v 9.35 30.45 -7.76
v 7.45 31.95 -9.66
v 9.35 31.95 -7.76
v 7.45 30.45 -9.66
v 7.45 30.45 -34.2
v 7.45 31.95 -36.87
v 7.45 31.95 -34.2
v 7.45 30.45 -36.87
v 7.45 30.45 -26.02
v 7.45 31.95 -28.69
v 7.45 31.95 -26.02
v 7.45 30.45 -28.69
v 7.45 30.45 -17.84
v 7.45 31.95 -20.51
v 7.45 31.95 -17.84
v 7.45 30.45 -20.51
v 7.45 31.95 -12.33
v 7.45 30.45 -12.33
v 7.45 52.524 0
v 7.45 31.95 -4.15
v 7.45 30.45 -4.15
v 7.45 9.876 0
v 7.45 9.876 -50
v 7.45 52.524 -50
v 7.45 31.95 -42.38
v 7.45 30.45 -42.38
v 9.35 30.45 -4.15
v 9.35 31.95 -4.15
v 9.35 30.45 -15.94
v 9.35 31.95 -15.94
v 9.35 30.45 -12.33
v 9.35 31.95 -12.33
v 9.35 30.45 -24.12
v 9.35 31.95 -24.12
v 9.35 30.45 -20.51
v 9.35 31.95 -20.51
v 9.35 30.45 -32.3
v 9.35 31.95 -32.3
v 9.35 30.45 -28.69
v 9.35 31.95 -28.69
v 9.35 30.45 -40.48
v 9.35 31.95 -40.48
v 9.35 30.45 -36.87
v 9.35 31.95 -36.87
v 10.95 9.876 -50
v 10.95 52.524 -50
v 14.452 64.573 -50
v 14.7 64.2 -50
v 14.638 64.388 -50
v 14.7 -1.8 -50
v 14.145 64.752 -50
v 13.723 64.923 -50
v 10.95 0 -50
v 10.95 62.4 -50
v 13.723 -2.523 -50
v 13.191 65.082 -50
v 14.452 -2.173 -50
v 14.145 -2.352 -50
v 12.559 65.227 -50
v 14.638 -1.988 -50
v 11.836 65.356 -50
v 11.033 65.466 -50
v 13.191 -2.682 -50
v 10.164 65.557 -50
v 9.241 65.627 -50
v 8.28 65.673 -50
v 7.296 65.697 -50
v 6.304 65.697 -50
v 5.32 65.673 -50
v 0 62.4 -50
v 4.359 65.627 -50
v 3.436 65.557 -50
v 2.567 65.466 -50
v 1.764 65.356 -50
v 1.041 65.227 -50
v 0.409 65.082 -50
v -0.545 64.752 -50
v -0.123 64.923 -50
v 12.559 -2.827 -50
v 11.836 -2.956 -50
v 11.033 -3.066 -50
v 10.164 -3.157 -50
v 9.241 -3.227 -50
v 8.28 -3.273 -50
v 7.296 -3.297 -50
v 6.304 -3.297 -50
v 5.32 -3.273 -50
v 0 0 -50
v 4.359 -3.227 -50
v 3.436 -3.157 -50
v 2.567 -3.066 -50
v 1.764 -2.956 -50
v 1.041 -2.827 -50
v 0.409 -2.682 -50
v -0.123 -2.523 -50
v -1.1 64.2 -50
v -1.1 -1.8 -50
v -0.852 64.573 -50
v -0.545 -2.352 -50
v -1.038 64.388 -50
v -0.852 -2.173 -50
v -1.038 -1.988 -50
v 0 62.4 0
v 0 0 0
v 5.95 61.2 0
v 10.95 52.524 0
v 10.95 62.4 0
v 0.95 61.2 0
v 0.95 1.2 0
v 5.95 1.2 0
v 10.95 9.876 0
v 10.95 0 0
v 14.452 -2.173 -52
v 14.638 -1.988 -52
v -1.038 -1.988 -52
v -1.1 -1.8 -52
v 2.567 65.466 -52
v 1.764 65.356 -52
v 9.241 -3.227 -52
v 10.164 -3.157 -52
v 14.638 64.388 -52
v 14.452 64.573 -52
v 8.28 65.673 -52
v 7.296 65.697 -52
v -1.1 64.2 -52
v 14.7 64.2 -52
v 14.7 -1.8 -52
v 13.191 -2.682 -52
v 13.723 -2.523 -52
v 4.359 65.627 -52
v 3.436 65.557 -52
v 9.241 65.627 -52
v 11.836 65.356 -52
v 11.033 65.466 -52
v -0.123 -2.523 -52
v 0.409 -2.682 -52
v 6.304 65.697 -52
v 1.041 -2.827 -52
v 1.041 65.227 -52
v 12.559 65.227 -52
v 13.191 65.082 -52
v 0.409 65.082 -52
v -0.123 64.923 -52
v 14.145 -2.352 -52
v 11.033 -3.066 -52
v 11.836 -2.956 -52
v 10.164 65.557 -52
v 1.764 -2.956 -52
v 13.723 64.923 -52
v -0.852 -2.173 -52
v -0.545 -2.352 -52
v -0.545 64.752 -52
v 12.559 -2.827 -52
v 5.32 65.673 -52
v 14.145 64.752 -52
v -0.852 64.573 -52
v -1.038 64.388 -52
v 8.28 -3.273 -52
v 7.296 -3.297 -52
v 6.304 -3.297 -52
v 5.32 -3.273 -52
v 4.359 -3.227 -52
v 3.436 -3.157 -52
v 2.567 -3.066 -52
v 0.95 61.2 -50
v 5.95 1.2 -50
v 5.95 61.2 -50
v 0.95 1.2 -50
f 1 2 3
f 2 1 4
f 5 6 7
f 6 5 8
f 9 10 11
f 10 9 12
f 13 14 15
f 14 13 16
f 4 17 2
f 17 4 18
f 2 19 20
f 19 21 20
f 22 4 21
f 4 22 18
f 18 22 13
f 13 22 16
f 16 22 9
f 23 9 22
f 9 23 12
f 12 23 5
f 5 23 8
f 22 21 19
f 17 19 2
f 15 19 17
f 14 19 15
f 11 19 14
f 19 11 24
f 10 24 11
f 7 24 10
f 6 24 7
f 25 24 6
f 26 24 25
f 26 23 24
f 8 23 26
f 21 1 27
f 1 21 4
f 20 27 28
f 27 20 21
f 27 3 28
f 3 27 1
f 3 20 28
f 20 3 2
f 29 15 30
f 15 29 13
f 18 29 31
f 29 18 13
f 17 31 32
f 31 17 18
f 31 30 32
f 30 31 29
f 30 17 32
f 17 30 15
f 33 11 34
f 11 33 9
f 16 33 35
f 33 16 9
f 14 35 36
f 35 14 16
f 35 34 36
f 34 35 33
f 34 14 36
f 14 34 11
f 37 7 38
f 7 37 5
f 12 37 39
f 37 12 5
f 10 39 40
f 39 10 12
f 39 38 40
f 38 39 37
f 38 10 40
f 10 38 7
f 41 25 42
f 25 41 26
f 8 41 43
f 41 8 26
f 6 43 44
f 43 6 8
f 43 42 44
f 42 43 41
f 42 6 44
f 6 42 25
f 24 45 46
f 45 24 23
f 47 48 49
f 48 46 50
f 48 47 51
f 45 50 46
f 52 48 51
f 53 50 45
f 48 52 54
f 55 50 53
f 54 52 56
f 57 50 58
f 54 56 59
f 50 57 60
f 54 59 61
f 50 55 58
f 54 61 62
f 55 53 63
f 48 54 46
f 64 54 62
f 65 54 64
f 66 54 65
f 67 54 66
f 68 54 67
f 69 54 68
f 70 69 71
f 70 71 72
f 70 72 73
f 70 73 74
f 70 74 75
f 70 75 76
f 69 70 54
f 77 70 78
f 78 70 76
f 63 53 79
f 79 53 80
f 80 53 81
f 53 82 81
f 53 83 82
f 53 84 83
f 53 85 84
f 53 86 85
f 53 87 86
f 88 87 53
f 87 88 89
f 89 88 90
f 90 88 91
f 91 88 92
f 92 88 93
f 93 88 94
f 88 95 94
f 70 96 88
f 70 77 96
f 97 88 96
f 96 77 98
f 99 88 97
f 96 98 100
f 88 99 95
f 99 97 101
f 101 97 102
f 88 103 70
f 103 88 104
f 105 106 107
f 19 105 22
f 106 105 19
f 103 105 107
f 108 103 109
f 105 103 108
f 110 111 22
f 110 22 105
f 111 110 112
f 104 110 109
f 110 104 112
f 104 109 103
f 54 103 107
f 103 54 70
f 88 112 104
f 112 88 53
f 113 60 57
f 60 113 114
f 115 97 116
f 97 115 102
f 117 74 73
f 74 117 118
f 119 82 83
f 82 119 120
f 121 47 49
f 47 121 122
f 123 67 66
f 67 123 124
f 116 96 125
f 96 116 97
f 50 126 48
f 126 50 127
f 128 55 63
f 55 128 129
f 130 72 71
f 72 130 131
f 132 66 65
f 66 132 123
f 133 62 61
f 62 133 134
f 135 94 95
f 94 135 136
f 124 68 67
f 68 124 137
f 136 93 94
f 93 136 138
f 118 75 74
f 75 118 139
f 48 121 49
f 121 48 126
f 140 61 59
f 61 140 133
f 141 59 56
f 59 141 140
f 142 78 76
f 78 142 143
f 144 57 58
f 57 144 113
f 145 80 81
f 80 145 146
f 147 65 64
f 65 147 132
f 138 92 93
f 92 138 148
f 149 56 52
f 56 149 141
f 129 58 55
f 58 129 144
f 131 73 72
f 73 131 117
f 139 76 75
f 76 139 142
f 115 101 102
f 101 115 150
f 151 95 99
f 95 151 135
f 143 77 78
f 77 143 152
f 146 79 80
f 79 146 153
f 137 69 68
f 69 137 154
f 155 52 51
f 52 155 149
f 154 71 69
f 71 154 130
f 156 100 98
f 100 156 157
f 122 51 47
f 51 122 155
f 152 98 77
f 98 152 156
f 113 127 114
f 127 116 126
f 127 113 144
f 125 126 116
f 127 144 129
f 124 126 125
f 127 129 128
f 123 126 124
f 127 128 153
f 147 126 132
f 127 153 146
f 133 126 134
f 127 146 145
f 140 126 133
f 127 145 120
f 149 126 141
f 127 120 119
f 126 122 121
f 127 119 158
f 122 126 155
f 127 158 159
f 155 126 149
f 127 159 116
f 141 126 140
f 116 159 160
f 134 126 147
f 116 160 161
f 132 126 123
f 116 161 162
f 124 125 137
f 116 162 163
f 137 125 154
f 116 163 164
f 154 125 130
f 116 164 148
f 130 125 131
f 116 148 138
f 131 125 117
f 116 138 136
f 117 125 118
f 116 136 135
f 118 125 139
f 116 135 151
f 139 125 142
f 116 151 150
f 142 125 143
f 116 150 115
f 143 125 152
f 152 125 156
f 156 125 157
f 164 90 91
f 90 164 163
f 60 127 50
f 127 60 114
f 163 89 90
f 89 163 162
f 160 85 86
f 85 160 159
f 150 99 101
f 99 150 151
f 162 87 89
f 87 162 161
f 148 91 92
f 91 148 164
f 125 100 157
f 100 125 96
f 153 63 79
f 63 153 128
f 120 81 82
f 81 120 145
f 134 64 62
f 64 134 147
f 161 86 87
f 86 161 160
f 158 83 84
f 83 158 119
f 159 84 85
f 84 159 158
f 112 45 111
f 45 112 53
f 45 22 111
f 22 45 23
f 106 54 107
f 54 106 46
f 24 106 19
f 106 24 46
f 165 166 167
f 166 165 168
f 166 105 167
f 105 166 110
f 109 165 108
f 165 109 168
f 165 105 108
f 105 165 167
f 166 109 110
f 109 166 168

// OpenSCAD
/* [Which Part] */

// Part to render
part = "InnerBoxPrint"; // [ InnerBoxPrint, OuterBoxPrint1, OuterBoxPrint2, SliderPrint, InnerBox, OuterBox, Slider ]

// Used for Slider part only.  Which slider number this is, 0-indexed.
slider_num = 0;

// Used for Slider part only.  Which position number this slider is coded for, 0-indexed.
position_num = 0;


/* [Main] */

// The string of position labels to use for the primary scale.
primary_scale = "0123456789";

// The string of position labels to use for the secondary scale, or undef if only one scale.
secondary_scale = undef;

// Which scale (0 for primary, 1 for secondary) to use for each slider.  This also defines the number of sliders.
slider_scales = [ 0, 0, 0, 0, 0 ];

// Inner dimensions of box cavity: width, depth, height; when drawer is facing to the right
inner_size = [ 50, 60, 5 ];


/* [Misc] */

// Depth of the detent hole
detent_height = 0.7;

// Maximum length of the detent lever arm (from the slider connector piece to the detent peg).  A smaller length may be chosen if possible to fit in two detent pegs.
detent_lever_arm_length_max = 20.0;

// Minimum length of the detent lever arm.
detent_lever_arm_length_min = 10.0;

// Defines the width of the margins on the +x and -x side of the box top, as a fraction of the box width
outer_box_top_margin_frac = 0.1;

// The width of the separating walls between sliders, as a fraction of the total width of the slider space
slider_separator_width_frac = 0.03;

// Minimum absolute width of separating walls between sliders.  If the calculated width is below the minimum, separating walls will be removed entirely.
min_between_slider_wall_width = 2;

// The length of the connecting piece of the slider, as a fraction of the outer box depth.  Larger values are stronger but reduce travel length and compress symbols.  The multiplier is arbitrarily chosen.  This is the main parameter to tweak for altering travel distance vs slider stabilization in this dimension.
slider_connector_length_frac = 0.083;

// The width of the connecting piece of the slider, as a fraction of the space between the centers of 2 adjacent sliders.  This also determines slot width.
slider_connector_width_frac = 0.2;

// Amount the handle on the slider protrudes
slider_handle_height = 1.5;

// The depth (along the length of the slider) of space that the handle takes up, as a fraction of the length of the slider's top wing
slider_handle_depth_frac = 0.125;

// Minimum opening span of the slider gates.  This ensures proper printing and proper clearances, but if the scale is too compact, may cause adjacent slider positions to also allow through the pins.
min_gate_opening = 2.5;

// The width of the slider's gate fin, as a fraction of the width of the right half of the bottom wing.
slider_gate_width_frac = 0.5;


/* [Marks] */
// Depth of scale markings
scale_mark_height = 0.3;

// Width/thickness of scale marking lines
scale_mark_width = 0.4;

// Type of primary scale
primary_scale_mark_type = "compact"; // [ ticks, full, compact ]

// Type of secondary scale
secondary_scale_mark_type = "compact"; // [ ticks, full, compact ]

// Used to guess how much space a label will take up.  This should be the ratio of character width to character height, approximately.  Adjust this if scale labels are intersecing the edges.
font_width_to_height_ratio = 0.95;

// Multiplier to turn a bounding box height into an approximate font point size
font_height_to_point_size_multiplier = 0.9;


/* [Minor Dims] */

// Thickness of inner box walls
inner_box_wall_thick = 1.2;

// Thickness of inner box bottom
inner_box_bottom_thick = 0.95;

// Thickness of inner box top
inner_box_top_thick = 1.5;

// Thickness of the backplate/handle on the end of the inner box
inner_box_end_plate_thick = 2;

// Distance the inner box handles protrudes to either side of the outer box when closed
inner_box_side_handle_protrusion = 1.5;

// Minimum thickness at thinnest point of outer box top
outer_box_min_top_thick = 1.7;

// Outer box wall thicknesses
outer_box_wall_thick = 1.5;

// Outer box bottom thickness
outer_box_bottom_thick = 0.95;

// Thickess of the slider top wing plate/detent arm
slider_top_wing_thick = 1.2;

// Thickness of the bottom wing; thicker values are stiffer but bulkier
slider_bottom_wing_thick = 1.5;

// The fraction of the gate hole width/depth that should be indented for false gates
false_gate_indent_width_frac = 0.2;

// The width and depth of the binary pips that mark each slider with its position
binary_pips_mark_depth = 0.2;

// Width of binary pips
binary_pips_mark_width = 0.5;

/* [Clearances] */

// The amount of sliding play/clearance the inner box has inside the outer box in the Y dimension
inner_box_play_y = 0.6;

// Minimum height of intersection between pins on inner box and gate fins on the sliders.
gate_pin_contact_height = 1.5;

// Amount of play/clearance between slider wings and the slot it rides in.
slider_wing_play_z = 0.2;

// The minimum amount of clearance between the gates on the bottom of the sliders, and the top of the inner box.
gate_inner_box_top_clearance_z = 0.2;

// Minimum clearance between the tops of the pins on the inner box and the bottoms of the slider wings
pin_wing_clearance_z = 0.2;

// The clearance between the tops of the rails on the inner box and the bottom of the outer box lid.
inner_box_top_rail_play_z = 0.3;

// Clearance between each slider and either the adjacent slider or the slot wall in the X dimension
slider_top_wing_clearance_x = 0.3;

// Amount of play the slider has in the X dimension
slider_play_x = 0.45;

// Extra clearance between bottom of slider gate and top of inner box, in addition to existing plays and clearances.
slider_gate_inner_box_top_clearance_extra = 0;

// Clearances around box front cutouts for inserting sliders
outer_box_front_slider_cutout_clearance = 0.2;

// Clearance between bottom wing of slider and the top rails in the first and last positions
bottom_wing_top_rail_clearance = 0.2;

// Amount of clearance in the X dimension between a pin and its gate when the box is closed.  This translates to slop in opening of the box while locked.
pin_gate_closed_clearance_x = 0.2;

// Amount of extra clearance between the back side of an inner box pin and the previous gate it runs next to.
pin_next_gate_closed_clearance_x = 0.2;

// Extra clearance (in addition to inner_box_play_y) between pins and gates in Y dimension
pin_gate_clearance_y_extra = 0.2;

// Distance to extend slot length by to give a more positive detent click
slot_end_extra_clearance_y = 0.55;




module FlatPuzzleBoxPart(
    /* OPTIONS TO SELECT WHAT PART TO MAKE */
    // Which part of the box to create.  Values are "InnerBox", "OuterBox", or "Slider" for the parts in their native orientations.  For the printable versions, use "InnerBoxPrint", "OuterBoxPrint1", "OuterBoxPrint2", or "SliderPrint".
    part,
    // Used for Slider part only.  Which slider number this is, 0-indexed.
    slider_num = 0,
    // Used for Slider part only.  Which position number this slider is coded for, 0-indexed.
    position_num = 0,

    /* PRIMARY OPTIONS */
    // The string of position labels to use for the primary scale.
    //primary_scale = "0123456789",
    primary_scale = "ABCDEFGHIJKLMNOPQRSTUVWXYZ",
    // The string of position labels to use for the secondary scale, or undef if only one scale.
    secondary_scale = undef,
    // Which scale (0 for primary, 1 for secondary) to use for each slider.  This also defines the number of sliders.
    slider_scales = [ 0, 0, 0, 0, 0 ],
    // Inner dimensions of box cavity: width, depth, height; when drawer is facing to the right
    inner_size = [ 50, 60, 5 ],

    /* MISC OPTIONS */
    // Depth of the detent hole
    detent_height = 0.7,
    // Maximum length of the detent lever arm (from the slider connector piece to the detent peg).  A smaller length may be chosen if possible to fit in two detent pegs.
    detent_lever_arm_length_max = 20,
    // Minimum length of the detent lever arm.
    detent_lever_arm_length_min = 10,
    // Defines the width of the margins on the +x and -x side of the box top, as a fraction of the box width
    outer_box_top_margin_frac = 0.1,
    // The width of the separating walls between sliders, as a fraction of the total width of the slider space
    slider_separator_width_frac = 0.03,
    // Minimum absolute width of separating walls between sliders.  If the calculated width is below the minimum, separating walls will be removed entirely.
    min_between_slider_wall_width = 2,
    // The length of the connecting piece of the slider, as a fraction of the outer box depth.  Larger values are stronger but reduce travel length and compress symbols.  The multiplier is arbitrarily chosen.  This is the main parameter to tweak for altering travel distance vs slider stabilization in this dimension.
    slider_connector_length_frac = 0.083,
    // The width of the connecting piece of the slider, as a fraction of the space between the centers of 2 adjacent sliders.  This also determines slot width.
    slider_connector_width_frac = 0.2,
    // Amount the handle on the slider protrudes
    slider_handle_height = 1.5,
    // The depth (along the length of the slider) of space that the handle takes up, as a fraction of the length of the slider's top wing
    slider_handle_depth_frac = 0.125,
    // Minimum opening span of the slider gates.  This ensures proper printing and proper clearances, but if the scale is too compact, may cause adjacent slider positions to also allow through the pins.
    min_gate_opening = 2.5,
    // The width of the slider's gate fin, as a fraction of the width of the right half of the bottom wing.
    slider_gate_width_frac = 0.5,

    /* MARKING AND SCALE OPTIONS */
    // Depth of scale markings
    scale_mark_height = 0.3,
    // Width/thickness of scale marking lines
    scale_mark_width = 0.4,
    primary_scale_mark_type = "compact",
    secondary_scale_mark_type = "compact",
    // Used to guess how much space a label will take up.  This should be the ratio of character width to character height, approximately.  Adjust this if scale labels are intersecing the edges.
    font_width_to_height_ratio = 0.95,
    // Multiplier to turn a bounding box height into an approximate font point size
    font_height_to_point_size_multiplier = 0.9,

    /* THICKNESSES AND MINOR FEATURE DIMENSIONS */
    // Thicknesses of parts of the inner box
    inner_box_wall_thick = 1.2,
    inner_box_bottom_thick = 0.95,
    inner_box_top_thick = 1.5,
    // Thickness of the backplate/handle on the end of the inner box
    inner_box_end_plate_thick = 2,
    // Distance the inner box handles protrudes to either side of the outer box when closed
    inner_box_side_handle_protrusion = 1.5,
    // Minimum thickness at thinnest point of outer box top
    outer_box_min_top_thick = 1.7,
    // Other outer box wall thicknesses
    outer_box_wall_thick = 1.5,
    outer_box_bottom_thick = 0.95,
    // Thickess of the slider top wing plate/detent arm
    slider_top_wing_thick = 1.2,
    // Thickness of the bottom wing; thicker values are stiffer but bulkier
    slider_bottom_wing_thick = 1.5,
    // The fraction of the gate hole width/depth that should be indented for false gates
    false_gate_indent_width_frac = 0.2,
    // The width and depth of the binary pips that mark each slider with its position
    binary_pips_mark_depth = 0.2,
    binary_pips_mark_width = 0.5,

    /* CLEARANCES AND PLAYS */
    // The amount of sliding play/clearance the inner box has inside the outer box in the Y dimension
    inner_box_play_y = 0.6,
    // Minimum height of intersection between pins on inner box and gate fins on the sliders.
    gate_pin_contact_height = 1.5,
    // Amount of play/clearance between slider wings and the slot it rides in.
    slider_wing_play_z = 0.2,
    // The minimum amount of clearance between the gates on the bottom of the sliders, and the top of the inner box.
    gate_inner_box_top_clearance_z = 0.2,
    // Minimum clearance between the tops of the pins on the inner box and the bottoms of the slider wings
    pin_wing_clearance_z = 0.2,
    // The clearance between the tops of the rails on the inner box and the bottom of the outer box lid.
    inner_box_top_rail_play_z = 0.3,
    // Clearance between each slider and either the adjacent slider or the slot wall in the X dimension
    slider_top_wing_clearance_x = 0.3,
    // Amount of play the slider has in the X dimension
    slider_play_x = 0.45,
    // Extra clearance between bottom of slider gate and top of inner box, in addition to existing plays and clearances.
    slider_gate_inner_box_top_clearance_extra = 0,
    // Clearances around box front cutouts for inserting sliders
    outer_box_front_slider_cutout_clearance = 0.2,
    // Clearance between bottom wing of slider and the top rails in the first and last positions
    bottom_wing_top_rail_clearance = 0.4,
    // Amount of clearance in the X dimension between a pin and its gate when the box is closed.  This translates to slop in opening of the box while locked.
    pin_gate_closed_clearance_x = 0.3,
    // Amount of extra clearance between the back side of an inner box pin and the previous gate it runs next to.
    pin_next_gate_closed_clearance_x = 0.2,
    // Extra clearance (in addition to inner_box_play_y) between pins and gates in Y dimension
    pin_gate_clearance_y_extra = 0.2,
    // Distance to extend slot length by to give a more positive detent click
    slot_end_extra_clearance_y = 0.55,

) {


// Returns true if all elements in the input array are true
function all_true (ar, i=0) = len(ar) < i ? (ar[i] ? all_true(ar, i+1) : false) : true;


// The scales displayed in the left and right margins
scale_left_margin_type = primary_scale_mark_type;
scale_left_margin_slider = search(0, slider_scales)[0];
scale_right_margin_type = secondary_scale_mark_type;
scale_right_margin_slider = (secondary_scale == undef || len(search(1, slider_scales)) == 0) ? scale_left_margin_slider : search(1, slider_scales)[0];

// Size of interior cavity of inner box.  The opening faces -X
inner_box_inner_size = inner_size;
num_sliders = len(slider_scales);
// Array, indexed by slider number, of arrays of positions for that slider.
slider_positions = [ for (scalenum = slider_scales) [ for (c = (scalenum == 0 ? primary_scale : secondary_scale)) c ] ];

// Calculated inner box main outer dimensions, not including rails and pins on the top, or handle on the front.
inner_box_main_outer_size = inner_box_inner_size + [
    0, // main width of inner box is open at both ends; the end plate caps off one of these ends
    2 * inner_box_wall_thick,
    inner_box_bottom_thick + inner_box_top_thick
];

// Height that the pins rise above the top of the inner box.
inner_box_pin_height = gate_pin_contact_height + gate_inner_box_top_clearance_z + slider_wing_play_z;

// Thickness of the outer box top at its thickest point
outer_box_top_thick = outer_box_min_top_thick + max(slider_top_wing_thick + detent_height, scale_mark_height);

// Size of inner cavity in outer box.
outer_box_inner_size = inner_box_main_outer_size + [
    0,
    inner_box_play_y,
    inner_box_pin_height + pin_wing_clearance_z + slider_bottom_wing_thick + slider_wing_play_z
];
outer_box_outer_size = outer_box_inner_size + [ outer_box_wall_thick, 2 * outer_box_wall_thick, outer_box_bottom_thick + outer_box_top_thick ];

// The height of the top rails on the inner box.
inner_box_top_rail_height = outer_box_inner_size.z - inner_box_main_outer_size.z - inner_box_top_rail_play_z;

// Width of margins on the +x and -x sides of the box top
outer_box_top_margins_x_min = outer_box_outer_size.x * outer_box_top_margin_frac;
outer_box_top_margins_x = max(outer_box_top_margins_x_min, outer_box_wall_thick);

// Effective width on the top of the outer box that can be used for sliders.
effective_slider_area_width = outer_box_outer_size.x - 2*outer_box_top_margins_x - 2*slider_top_wing_clearance_x;
// The target width of the walls between sliders.  This is arbitrary, and can be 0.
target_between_slider_wall_width = slider_separator_width_frac * effective_slider_area_width;
// The chosen width of walls in between sliders, or 0 to indicate no walls.
between_slider_wall_width = target_between_slider_wall_width >= min_between_slider_wall_width ? target_between_slider_wall_width : 0;
echo("Between Slider Wall Width", between_slider_wall_width);

// The amount of X space in between the top wings of adjacent sliders.  Depends on whether or not there are walls between.
slider_top_wing_width_between = between_slider_wall_width > 0 ? (between_slider_wall_width + 2*slider_top_wing_clearance_x) : slider_top_wing_clearance_x;
// Space between sliders
slider_spacing = (effective_slider_area_width - slider_top_wing_width_between * (num_sliders - 1)) / num_sliders + slider_top_wing_width_between;
// Width of the top plate on the slider
slider_top_wing_width = slider_spacing - slider_top_wing_width_between;
// The X coordinate of each of the sliders, centered on the slider.
sliders_x = [ for (i = [ 0 : num_sliders-1 ]) outer_box_top_margins_x + slider_top_wing_clearance_x + slider_top_wing_width/2 + i * slider_spacing ];
echo("First/Last Slider Edge Distances", sliders_x[0], outer_box_outer_size.x - sliders_x[len(sliders_x) - 1]);
//assert(sliders_x[0] == outer_box_outer_size.x - sliders_x[len(sliders_x) - 1]); // first and last slider are equidistant from their nearest edge

// Length of the connector between the top and bottom parts of the slider.  Larger values are stronger but reduce travel length and compress symbols.  The multiplier is arbitrarily chosen.  This is the main parameter to tweak for altering travel distance vs slider stabilization in this dimension.
slider_connector_length = slider_connector_length_frac * outer_box_outer_size.y;

// These multipliers here are calculated such that top wing just covers whole slot at one extreme.
// The length of the part of the slot that the slider travels in
slot_travel_length = (1/3) * outer_box_outer_size.y + (2/3) * slider_connector_length;
// The distance that the slider can travel
slider_travel_length = slot_travel_length - slider_connector_length;
// Offset from the slot to the outer edge of the box
slot_edge_offset = (1/3) * (outer_box_outer_size.y - slider_connector_length);
// Length/depth of the top wing/plate on the slider
slider_top_wing_length = (2/3) * (outer_box_outer_size.y - slider_connector_length) + slider_connector_length;

// Width of the 'connector' portion of the slider, the part that rides in the slots.  The multiplier here is arbitrarily chosen.
slider_connector_width = slider_connector_width_frac * slider_spacing;
// The width of the slots in the box
slot_width = slider_connector_width + slider_play_x;


// Diameter of the handle bump
slider_handle_depth = slider_top_wing_length * slider_handle_depth_frac;
// Height of connecting piece of slider
slider_connector_height = outer_box_top_thick - slider_top_wing_thick + slider_wing_play_z;
// Width of bottom wing right-of-center.
slider_bottom_wing_width_right = slider_top_wing_width / 2;
// Width of bottom wing left-of-center.  Can be reduced so long as it doesn't drop below half the connector width.
// The problem with increasing this to the full slider_bottom_wing_width_right is that the front cutouts on the box would then intersect each other if there are no separators between sliders.  There needs to be some space between.
// TODO: Calculate this based on the actual separation between the box front cutouts.
slider_bottom_wing_width_left = max(slider_bottom_wing_width_right / 2.5, slider_connector_width / 2);


// The Y coordinate corresponding to the center of the slider [connector segment] in its near position.  (In coordinate space of outer box)
slider_positions_y_begin = slot_edge_offset + slider_connector_length / 2;
// The Y coordinate corresponding to the center of the slider [connector segment] in its far position
slider_positions_y_end = outer_box_outer_size.y - slider_positions_y_begin;
echo("Slider travel length compare", slider_positions_y_end - slider_positions_y_begin, slider_travel_length);
//assert(slider_positions_y_end - slider_positions_y_begin == slider_travel_length);  // Make sure the slider travel length equals the spacing between first and last position
// Space between positions of the slider for each slider
slider_positions_spacing = [ for (i = [ 0 : num_sliders - 1 ]) (slider_positions_y_end - slider_positions_y_begin) / (len(slider_positions[i]) - 1) ];
// Y coordinates corresponding to the center of the slider for each slider position for each slider.  The first position is slider_positions_y_end and positions are evenly spaced.
slider_positions_y = [
    for (i = [ 0 : num_sliders - 1 ])
        [ for (j = [ len(slider_positions[i]) - 1 : -1 : 0 ])
            slider_positions_y_begin + j * slider_positions_spacing[i]
        ]
];
// Size of openings in the slider gate
slider_gate_opening = [ for (i = [ 0 : num_sliders - 1 ]) max(min_gate_opening, slider_positions_spacing[i]) ];
// Depth (Y dimension/length) of gate at bottom of slider
slider_gate_depth = max([ for (i = [ 0 : num_sliders - 1 ]) slider_positions_y[i][0] - slider_positions_y[i][len(slider_positions_y[i]) - 1] + slider_gate_opening[i] ]);
// Width of slider gate.  Value is arbitrary and partly controls strength of gates versus strength of pins.
slider_gate_width = slider_gate_width_frac * slider_bottom_wing_width_right;
assert(slider_gate_width < slider_bottom_wing_width_left + slider_bottom_wing_width_right - slider_gate_width);
// Height of the gate component of the slider
slider_gate_height = outer_box_inner_size.z - inner_box_main_outer_size.z - slider_bottom_wing_thick - slider_wing_play_z - inner_box_top_rail_play_z - slider_gate_inner_box_top_clearance_extra;
echo("slider_bottom_wing_width_right", slider_bottom_wing_width_right);
echo("slider_bottom_wing_width_left", slider_bottom_wing_width_left);
echo("slider_gate_depth", slider_gate_depth);
echo("slider_positions_y[0][0]", slider_positions_y[0][0]);
echo("slider_positions_y[0][len(slider_positions_y[0]) - 1]", slider_positions_y[0][len(slider_positions_y[0]) - 1]);
echo("slider_gate_opening", slider_gate_opening);

// Width of the top rails on the inner box
inner_box_top_rail_depth = slider_positions_y_begin - slider_gate_depth / 2 - outer_box_wall_thick - bottom_wing_top_rail_clearance;

// Size of pin in X dimension.  This is calculated to fit underneath the individual slider's top wing footprint.
inner_box_pin_width = slider_top_wing_width / 2 + slider_bottom_wing_width_right - slider_gate_width - pin_gate_closed_clearance_x - pin_next_gate_closed_clearance_x;
// Size of pins in Y dimension
inner_box_pin_depth = min(slider_gate_opening) - inner_box_play_y - 2 * pin_gate_clearance_y_extra;

// Max size of the detent peg in Y dimension so prevent detent sockets from overlapping
max_detent_peg_size_y_by_slider = [ for (posar = slider_positions) slider_travel_length / (len(posar) - 1) ];
max_detent_peg_size_y = min(max_detent_peg_size_y_by_slider);
// Size of the detent peg in the Y dimension (depth)
detent_peg_size_y = min(detent_height * 2, max_detent_peg_size_y);
// Minimum Y distance from the Y center of the detent pin on the slider to the edge of the top wing
detent_peg_edge_dist_min = max(detent_peg_size_y / 2, (slider_top_wing_length - slider_connector_length) / 2 - detent_lever_arm_length_max);
// Maximum distance.  Multiplier is arbitrary and determines the range of how close to the edge the detent peg must be.
//detent_peg_edge_dist_max = 0.3 * ((slider_top_wing_length - slider_connector_length) / 2 - detent_peg_size_y/2);
detent_peg_edge_dist_max = (slider_top_wing_length - slider_connector_length) / 2 - detent_lever_arm_length_min;
assert(detent_peg_edge_dist_max > detent_peg_edge_dist_min);

// For each slider, determine whether the slider can have 2 detent pins, or just one.
// This is determined by: If there are 2 detent pins, they must be a whole multiple of the position distance apart.  Check if there's such a multiple that fits the constraints on detent pin edge positioning.
// The maximum number of detent positions that can fit within the working area of the slider
max_detent_positions_by_slider = [ for (i = [ 0 : num_sliders - 1 ]) floor((slider_top_wing_length - 2 * detent_peg_edge_dist_min) / slider_positions_spacing[i]) ];
// The amount of space (Y) between the dual detent pins on a slider.  This may be 0 or negative in some cases where dual pins aren't possible.
detent_peg_spacing_by_slider = [ for (i = [ 0 : num_sliders-1 ]) (max_detent_positions_by_slider[i] - 1) * slider_positions_spacing[i] ];
// For each slider, whether or not the sliders positions would allow dual detent pegs.
can_have_dual_detent_peg_by_slider = [ for (i = [ 0 : num_sliders-1 ]) detent_peg_spacing_by_slider[i] >= 0 && (slider_top_wing_length - detent_peg_spacing_by_slider[i]) / 2 <= detent_peg_edge_dist_max ];
// Single flag for whether sliders should have dual detent pegs
dual_detent_pegs = all_true(can_have_dual_detent_peg_by_slider);
// The distance of the detent peg(s) from the edge of the slider
detent_peg_edge_dist_by_slider = [ for (i = [ 0 : num_sliders-1 ]) dual_detent_pegs ? (slider_top_wing_length - detent_peg_spacing_by_slider[i]) / 2 : detent_peg_edge_dist_min ];
echo("Has dual detent pegs", dual_detent_pegs);
echo("Detent edge dist by slider", detent_peg_edge_dist_by_slider);
echo("Detent peg spacing by slider", detent_peg_spacing_by_slider);
echo("Max detent positions by slider", max_detent_positions_by_slider);
echo("Slider positions spacing", slider_positions_spacing);
echo("Detent lever arm length by slider", [ for (edgedist = detent_peg_edge_dist_by_slider) (slider_top_wing_length - slider_connector_length) / 2 - edgedist ]);
for (edgedist = detent_peg_edge_dist_by_slider) {
	// If either of these assertions fail, the constraints on detent_lever_arm_length are probably set too tightly
	assert(edgedist >= detent_peg_size_y / 2);
	assert(edgedist <= (slider_top_wing_length - slider_connector_length) / 2 - detent_peg_size_y / 2);
}

// How far the false gate impressions are inset
false_gate_indent_width = slider_gate_width * false_gate_indent_width_frac;


function to_binary_array_helper(n, placeval) = placeval == 1 ? [ n ] : concat([ floor(n / placeval) ], to_binary_array_helper( n - floor(n / placeval) * placeval, placeval / 2));
// Converts a number into an array of binary digits 0 and 1.  The length of the array is determined by max_n.
function to_binary_array(n, max_n) = to_binary_array_helper(n, 2 ^ (floor(log(max_n) / log(2))));
module BinaryPips(n, max_n, width, depth) {
    // Generates a subtractive geometry that will mark a surface with the number in binary.  Surface size is specified as widthxdepth
    // The numeric digits go from left to right along the X axis, centered on the origin.
    // The Y dimension is centered on the origin.
    // The Z dimension is the depth of the marking, configured here.
    mark_depth = binary_pips_mark_depth;
    mark_width = binary_pips_mark_width;
    digits = to_binary_array(n, max_n);
    spacing = width / (len(digits) + 1);
    for (digitnum = [ 0 : len(digits) - 1 ])
        translate([ (digitnum + 1) * spacing - width/2, 0, 0 ])
            if (digits[digitnum] == 0)
                translate([ -mark_width/2, -mark_width/2, -mark_depth ])
                    cube([ mark_width, mark_width, mark_depth ]);
            else
                translate([ -mark_width/2, -depth/2, -mark_depth ])
                    cube([ mark_width, depth, mark_depth ]);
};


// Negative cutouts for position tick marks
module ScaleTickMarks(slider_num, width) {
    for (y = slider_positions_y[slider_num])
        translate([ -width/2, y - scale_mark_width/2, -scale_mark_height ])
            cube([ width, scale_mark_width, scale_mark_height ]);
};


// Determine the font point size such that a character will fit inside the given rectangle.  This is a guesstimate.
function font_size_within_rect(w, h) = min(h * font_height_to_point_size_multiplier, w / font_width_to_height_ratio * font_height_to_point_size_multiplier);

// Full scale with symbol for each position
module ScaleFull(slider_num, scale_width, scale_align="right") {
    // Tick marks
    tick_width = scale_width / 5; // arbitrary multiplier
    if (scale_align == "right")
        translate([ scale_width / 2 - tick_width / 2, 0, 0 ])
            ScaleTickMarks(slider_num, tick_width);
    if (scale_align == "left")
        translate([ -scale_width / 2 + tick_width / 2, 0, 0 ])
            ScaleTickMarks(slider_num, tick_width);
    // Symbols
    font_size = font_size_within_rect(scale_width - tick_width, slider_positions_spacing[slider_num]);
    for (i = [ 0 : len(slider_positions[slider_num])-1 ])
        translate([ scale_align == "right" ? -tick_width/2 : tick_width/2, slider_positions_y[slider_num][i], -scale_mark_height ])
            linear_extrude(scale_mark_height)
                text(slider_positions[slider_num][i], size=font_size, halign="center", valign="center");
};

// Compact scale with only first and last positions marked with symbol
module ScaleCompact(slider_num, scale_width, scale_align="right") {
    // Tick marks
    tick_width = scale_width / 2; // arbitrary multiplier
    if (scale_align == "right")
        translate([ scale_width / 2 - tick_width / 2, 0, 0 ])
            ScaleTickMarks(slider_num, tick_width);
    if (scale_align == "left")
        translate([ -scale_width / 2 + tick_width / 2, 0, 0 ])
            ScaleTickMarks(slider_num, tick_width);
    // Symbols
    font_size = font_size_within_rect(scale_width, slider_positions_y_begin);
    translate([ 0, slider_positions_y_end + font_size/2 + slider_positions_spacing[slider_num] / 2, -scale_mark_height ])
        linear_extrude(scale_mark_height)
            text(slider_positions[slider_num][0], size=font_size, halign="center", valign="center");
    translate([ 0, slider_positions_y_begin - font_size/2 - slider_positions_spacing[slider_num] / 2, -scale_mark_height ])
        linear_extrude(scale_mark_height)
            text(slider_positions[slider_num][len(slider_positions[slider_num])-1], size=font_size, halign="center", valign="center");

};


module Scale(slider_num, width, scale_type, scale_align="center") {
    if (scale_type == "ticks")
        ScaleTickMarks(slider_num, width);
    else if (scale_type == "full")
        ScaleFull(slider_num, width, scale_align);
    else if (scale_type == "compact")
        ScaleCompact(slider_num, width, scale_align);
    else
        assert(false);
};

module LeftMarginScale() {
    translate([ outer_box_top_margins_x/2, 0, outer_box_outer_size.z ])
        Scale(scale_left_margin_slider, outer_box_top_margins_x, scale_left_margin_type, "right");
};

module RightMarginScale() {
    translate([ outer_box_outer_size.x - outer_box_top_margins_x/2, 0, outer_box_outer_size.z ])
        Scale(scale_right_margin_slider, outer_box_top_margins_x, scale_right_margin_type, "left");
};

module IntraSliderScale(slider_num) {
    difference() {
        ScaleTickMarks(slider_num, slider_spacing);
        translate([ -(slider_top_wing_width + 2*slider_top_wing_clearance_x)/2, 0, -(scale_mark_height + 10) ])
            cube([ slider_top_wing_width + 2*slider_top_wing_clearance_x, outer_box_outer_size.y + 10, scale_mark_height + 10 ]);
        if (slider_num == 0)
            translate([ -slider_spacing/2, 0, -(scale_mark_height + 10) ])
                cube([ slider_spacing/2, outer_box_outer_size.y + 10, scale_mark_height + 10 ]);
        if (slider_num == num_sliders - 1)
            translate([ 0, 0, -(scale_mark_height + 10) ])
                cube([ slider_spacing/2, outer_box_outer_size.y + 10, scale_mark_height + 10 ]);
    };
};


module DetentPeg(width, extraheight=0) {
    // Triangular detent peg.  Top flush with XY plane at z=0.  Extends to given width over X, centered at x=0
    translate([ -width/2, 0, 0 ])
    rotate([ 90, 0, 90 ])
    linear_extrude(width)
    polygon([
        [ detent_peg_size_y / 2, 0 ],
        [ 0, -(detent_height + extraheight) ],
        [ -detent_peg_size_y / 2, 0 ]
    ]);
};


module Slider(slider_num, position_num) {
    
    module SliderHandle() {
        difference() {
            translate([ -slider_top_wing_width/2, -slider_handle_depth/2, 0 ])
                cube([ slider_top_wing_width, slider_handle_depth, slider_handle_height ]);
            // Index mark
            translate([ -(slider_top_wing_width + 10)/2, -scale_mark_width/2, slider_handle_height - scale_mark_height ])
                cube([ slider_top_wing_width + 10, scale_mark_width, 10 ]);
        };
    };
    
    module SliderTopWing() {
        translate([ -slider_top_wing_width/2, -slider_top_wing_length/2, 0 ])
            cube([ slider_top_wing_width, slider_top_wing_length, slider_top_wing_thick ]);
        // Detent pegs
        translate([ 0, -slider_top_wing_length/2 + detent_peg_edge_dist_by_slider[slider_num], 0 ])
                DetentPeg(slider_top_wing_width, slider_wing_play_z);
        if (dual_detent_pegs) {
            translate([ 0, slider_top_wing_length/2 - detent_peg_edge_dist_by_slider[slider_num], 0 ])
                DetentPeg(slider_top_wing_width, slider_wing_play_z);
        }
    };
    
    module SliderConnector() {
        translate([ -slider_connector_width/2, -slider_connector_length/2, 0 ])
            cube([ slider_connector_width, slider_connector_length, slider_connector_height ]);
    };
    
    module SliderBottomWing() {
        translate([ -slider_bottom_wing_width_left, -slider_gate_depth/2, 0 ])
            difference() {
                // Bottom wing
                cube([ slider_bottom_wing_width_left + slider_bottom_wing_width_right, slider_gate_depth, slider_bottom_wing_thick ]);
                // Markings for slider and position
                if (slider_num != undef && position_num != undef) {
                    translate([ 0, slider_gate_depth * (3/4), slider_bottom_wing_thick/2 ])
                        rotate([ 0, -90, 0 ])
                            rotate([ 0, 0, -90 ])
                                BinaryPips(slider_num, num_sliders-1, slider_gate_depth/2, slider_bottom_wing_thick);
                    translate([ 0, slider_gate_depth * (1/4), slider_bottom_wing_thick/2 ])
                        rotate([ 0, -90, 0 ])
                            rotate([ 0, 0, -90 ])
                                BinaryPips(position_num, len(slider_positions[slider_num])-1, slider_gate_depth/2, slider_bottom_wing_thick);
                }
            };
    };
    
    module SliderGate() {
        translate([ slider_bottom_wing_width_right - slider_gate_width, 0, 0 ])
            difference() {
                // Body of gate
                translate([ 0, slider_gate_depth/2, 0 ])
                    rotate([ 90, 0, 0 ])
                        linear_extrude(slider_gate_depth)
                            polygon([
                                [ slider_gate_width, 0 ],
                                [ 0, 0 ],
                                [ -slider_gate_height, slider_gate_height ],
                                [ slider_gate_width, slider_gate_height ]
                            ]);
                // Cutout
                if (position_num != undef)
                    translate([ -100, outer_box_outer_size.y/2 - slider_positions_y[slider_num][position_num] - slider_gate_opening[slider_num]/2, -5 ])
                        cube([ slider_gate_width + 200, slider_gate_opening[slider_num], slider_gate_height + 10 ]);
                // Fake cutouts
                fake_cutout_interval_modulo = max(ceil(slider_gate_opening[slider_num] / (slider_gate_depth / len(slider_positions[slider_num])) * 2.5), 3);
                if (position_num != undef)
                    for (p = [ position_num % fake_cutout_interval_modulo : fake_cutout_interval_modulo : len(slider_positions[slider_num]) - 1 ])
                        translate([ false_gate_indent_width, outer_box_outer_size.y/2 - slider_positions_y[slider_num][p] + slider_gate_opening[slider_num]/2, 0 ])
                            rotate([ 90, 0, 0 ])
                                linear_extrude(slider_gate_opening[slider_num])
                                    polygon([
                                        [ 0, 0 ],
                                        [ -slider_gate_height, slider_gate_height ],
                                        [ -100, slider_gate_height ],
                                        [ -100, 0 ]
                                    ]);
            };
    };
    
    SliderGate();
    translate([ 0, 0, slider_gate_height ])
        SliderBottomWing();
    translate([ 0, 0, slider_gate_height + slider_bottom_wing_thick ])
        SliderConnector();
    translate([ 0, 0, slider_gate_height + slider_bottom_wing_thick + slider_connector_height ])
        SliderTopWing();
    translate([ 0, 0, slider_gate_height + slider_bottom_wing_thick + slider_connector_height + slider_top_wing_thick ])
        SliderHandle();
    
};

module SliderFrontCutout() {
    difference() {
        translate([ 0, outer_box_wall_thick, 0 ])
            rotate([ 90, 0, 0 ])
                linear_extrude(outer_box_wall_thick + 10)
                    offset(r=outer_box_front_slider_cutout_clearance)
                        translate([ 0, -slider_gate_height - slider_bottom_wing_thick ])
                            projection()
                                rotate([ -90, 0, 0 ])
                                    Slider(0, undef);
        translate([ 0, 0, 100 ])
            cube([ 200, 200, 200 ], center=true);
    };
};


module InnerBox() {
    module Pin() {
        translate([ 0, inner_box_pin_depth/2, 0 ])
        rotate([ 90, 0, 0 ])
        linear_extrude(inner_box_pin_depth)
            if (inner_box_pin_width > inner_box_pin_height) {
                // Pin shape is rectangle next to triangle
                polygon([
                    [ 0, 0 ],
                    [ -inner_box_pin_height, inner_box_pin_height ],
                    [ -inner_box_pin_width, inner_box_pin_height ],
                    [ -inner_box_pin_width, 0 ]
                ]);
            } else {
                // Pin shape is just triangle
                polygon([
                    [ 0, 0 ],
                    [ -inner_box_pin_width, inner_box_pin_width ],
                    [ -inner_box_pin_width, 0 ]
                ]);
            }
    };

    module EndPlate() {
        // Plate at right end of box.  Also includes handles to pull.
        translate([ inner_box_end_plate_thick, 0, 0 ])
            rotate([ 0, -90, 0 ])
                linear_extrude(inner_box_end_plate_thick)
                    union() {
                        square([ outer_box_outer_size.z, outer_box_outer_size.y ]);
                        for (y = [ 0, outer_box_outer_size.y ])
                            translate([ outer_box_outer_size.z/2, y ])
                                scale([ outer_box_outer_size.z / inner_box_side_handle_protrusion / 2, 1.0 ])
                                    circle(r=inner_box_side_handle_protrusion, $fn=50);
                    };
    };

    difference() {
        union() {
            // Outer solid
            cube(inner_box_main_outer_size);
            // End Plate
            translate([ inner_box_main_outer_size.x, -(outer_box_outer_size.y - inner_box_main_outer_size.y) / 2, -outer_box_bottom_thick - inner_box_top_rail_play_z/2 ])
                EndPlate();
            // Top rails
            cube([ inner_box_main_outer_size.x, inner_box_top_rail_depth, inner_box_main_outer_size.z + inner_box_top_rail_height ]);
            translate([ 0, inner_box_main_outer_size.y - inner_box_top_rail_depth, 0 ])
                cube([ inner_box_main_outer_size.x, inner_box_top_rail_depth, inner_box_main_outer_size.z + inner_box_top_rail_height ]);
            // Pins
            for (slider_x = sliders_x) // note: this is relative to the outer box so needs to be offset
                translate([ slider_x - outer_box_wall_thick + slider_bottom_wing_width_right - slider_gate_width - pin_gate_closed_clearance_x, inner_box_main_outer_size.y / 2, inner_box_main_outer_size.z ])
                    Pin();
        };
        // Inner cavity
        translate([ -10, inner_box_wall_thick, inner_box_bottom_thick ])
            cube(inner_box_inner_size + [ 10, 0, 0 ]);
    };
};

module OuterBox() {
    difference() {
        // Outer solid
        cube(outer_box_outer_size);
        // Inner cavity
        translate([ outer_box_wall_thick, outer_box_wall_thick, outer_box_bottom_thick ])
            cube(outer_box_inner_size + [ 10, 0, 0 ]);
        // Slots in top
        for (x = sliders_x)
            translate([ x - slot_width/2, -10 + slot_end_extra_clearance_y, outer_box_outer_size.z - outer_box_top_thick - 0.1 ])
                cube([ slot_width, slot_edge_offset + slot_travel_length + 10, outer_box_top_thick + 10 ]);
        // Slots in front so sliders can be inserted
        for (i = [ 0 : num_sliders - 1 ])
            translate([ sliders_x[i], 0, outer_box_outer_size.z - outer_box_top_thick ])
                SliderFrontCutout();
        // Depressions in top for the sliders
        for (x = sliders_x)
            translate([ x - (slider_top_wing_width + 2*slider_top_wing_clearance_x) / 2, -5, outer_box_outer_size.z - slider_top_wing_thick ])
                cube([ slider_top_wing_width + 2*slider_top_wing_clearance_x, outer_box_outer_size.y + 10, outer_box_top_thick + 1 ]);
        // Detent sockets
        for (slidernum = [ 0 : num_sliders - 1 ])
            for (posnum = [ 0 : len(slider_positions[slidernum]) - 1 ])
                translate([ sliders_x[slidernum], slider_positions_y[slidernum][posnum], outer_box_outer_size.z - slider_top_wing_thick ])
                    union() {
                        translate([ 0, -slider_top_wing_length/2 + detent_peg_edge_dist_by_slider[slidernum], 0 ])
                            DetentPeg(slider_top_wing_width + 2*slider_top_wing_clearance_x);
                        translate([ 0, slider_top_wing_length/2 - detent_peg_edge_dist_by_slider[slidernum], 0 ])
                            DetentPeg(slider_top_wing_width + 2*slider_top_wing_clearance_x);
                    };
        // Scales on walls between sliders
        if (between_slider_wall_width > 0) // if there are walls
            for (i = [ 0 : num_sliders-1 ])
                translate([ sliders_x[i], 0, outer_box_outer_size.z ])
                    IntraSliderScale(i);
        // Scales on margins
        LeftMarginScale();
        RightMarginScale();
    };
};

module InnerBoxPrint() {
    rotate([ 0, 90, 0 ])
        InnerBox();
};

module OuterBoxPrint1() {
    difference() {
        OuterBox();
        translate([ outer_box_wall_thick, -5, outer_box_outer_size.z - outer_box_top_thick ])
            cube([ outer_box_outer_size.x - 2 * outer_box_wall_thick, outer_box_outer_size.y + 10, outer_box_top_thick + 10 ]);
        translate([ -5, outer_box_wall_thick, outer_box_outer_size.z - outer_box_top_thick ])
            cube([ outer_box_outer_size.x + 10, outer_box_outer_size.y - 2 * outer_box_wall_thick, outer_box_top_thick + 10 ]);
    };
    
    //rotate([ 90, 0, 0 ])
        //OuterBox();
};

module OuterBoxPrint2() {
    difference() {
        OuterBox();
        OuterBoxPrint1();
    };
};

module SliderPrint(sn, pn) {
    rotate([ 0, 90, 0 ])
        Slider(sn, pn);
};

if (part == "InnerBox")
    InnerBox();
else if (part == "OuterBox")
    OuterBox();
else if (part == "Slider")
    Slider(slider_num, position_num);
else if (part == "InnerBoxPrint")
    InnerBoxPrint();
else if (part == "OuterBoxPrint1")
    OuterBoxPrint1();
else if (part == "OuterBoxPrint2")
    OuterBoxPrint2();
else if (part == "SliderPrint")
    SliderPrint(slider_num, position_num);
else
    assert(false);
    

//InnerBoxPrint();
//OuterBoxPrint1();
//OuterBoxPrint2();
//SliderPrint(0, 3);

};




FlatPuzzleBoxPart(
    part = part,
    slider_num = slider_num,
    position_num = position_num,
    primary_scale = primary_scale,
    secondary_scale = secondary_scale,
    slider_scales = slider_scales,
    inner_size = inner_size,
    detent_height = detent_height,
    detent_lever_arm_length_max = detent_lever_arm_length_max,
    detent_lever_arm_length_min = detent_lever_arm_length_min,
    outer_box_top_margin_frac = outer_box_top_margin_frac,
    slider_separator_width_frac = slider_separator_width_frac,
    min_between_slider_wall_width = min_between_slider_wall_width,
    slider_connector_length_frac = slider_connector_length_frac,
    slider_connector_width_frac = slider_connector_width_frac,
    slider_handle_height = slider_handle_height,
    slider_handle_depth_frac = slider_handle_depth_frac,
    min_gate_opening = min_gate_opening,
    slider_gate_width_frac = slider_gate_width_frac,
    scale_mark_height = scale_mark_height,
    scale_mark_width = scale_mark_width,
    font_width_to_height_ratio = font_width_to_height_ratio,
    font_height_to_point_size_multiplier = font_height_to_point_size_multiplier,
    inner_box_wall_thick = inner_box_wall_thick,
    inner_box_bottom_thick = inner_box_bottom_thick,
    inner_box_top_thick = inner_box_top_thick,
    inner_box_end_plate_thick = inner_box_end_plate_thick,
    inner_box_side_handle_protrusion = inner_box_side_handle_protrusion,
    outer_box_min_top_thick = outer_box_min_top_thick,
    outer_box_wall_thick = outer_box_wall_thick,
    outer_box_bottom_thick = outer_box_bottom_thick,
    slider_top_wing_thick = slider_top_wing_thick,
    slider_bottom_wing_thick = slider_bottom_wing_thick,
    false_gate_indent_width_frac = false_gate_indent_width_frac,
    binary_pips_mark_depth = binary_pips_mark_depth,
    binary_pips_mark_width = binary_pips_mark_width,
    inner_box_play_y = inner_box_play_y,
    gate_pin_contact_height = gate_pin_contact_height,
    slider_wing_play_z = slider_wing_play_z,
    gate_inner_box_top_clearance_z = gate_inner_box_top_clearance_z,
    pin_wing_clearance_z = pin_wing_clearance_z,
    inner_box_top_rail_play_z = inner_box_top_rail_play_z,
    slider_top_wing_clearance_x = slider_top_wing_clearance_x,
    slider_play_x = slider_play_x,
    slider_gate_inner_box_top_clearance_extra = slider_gate_inner_box_top_clearance_extra,
    outer_box_front_slider_cutout_clearance = outer_box_front_slider_cutout_clearance,
    bottom_wing_top_rail_clearance = bottom_wing_top_rail_clearance,
    pin_gate_closed_clearance_x = pin_gate_closed_clearance_x,
    pin_next_gate_closed_clearance_x = pin_next_gate_closed_clearance_x,
    pin_gate_clearance_y_extra = pin_gate_clearance_y_extra,
    slot_end_extra_clearance_y = slot_end_extra_clearance_y
);
